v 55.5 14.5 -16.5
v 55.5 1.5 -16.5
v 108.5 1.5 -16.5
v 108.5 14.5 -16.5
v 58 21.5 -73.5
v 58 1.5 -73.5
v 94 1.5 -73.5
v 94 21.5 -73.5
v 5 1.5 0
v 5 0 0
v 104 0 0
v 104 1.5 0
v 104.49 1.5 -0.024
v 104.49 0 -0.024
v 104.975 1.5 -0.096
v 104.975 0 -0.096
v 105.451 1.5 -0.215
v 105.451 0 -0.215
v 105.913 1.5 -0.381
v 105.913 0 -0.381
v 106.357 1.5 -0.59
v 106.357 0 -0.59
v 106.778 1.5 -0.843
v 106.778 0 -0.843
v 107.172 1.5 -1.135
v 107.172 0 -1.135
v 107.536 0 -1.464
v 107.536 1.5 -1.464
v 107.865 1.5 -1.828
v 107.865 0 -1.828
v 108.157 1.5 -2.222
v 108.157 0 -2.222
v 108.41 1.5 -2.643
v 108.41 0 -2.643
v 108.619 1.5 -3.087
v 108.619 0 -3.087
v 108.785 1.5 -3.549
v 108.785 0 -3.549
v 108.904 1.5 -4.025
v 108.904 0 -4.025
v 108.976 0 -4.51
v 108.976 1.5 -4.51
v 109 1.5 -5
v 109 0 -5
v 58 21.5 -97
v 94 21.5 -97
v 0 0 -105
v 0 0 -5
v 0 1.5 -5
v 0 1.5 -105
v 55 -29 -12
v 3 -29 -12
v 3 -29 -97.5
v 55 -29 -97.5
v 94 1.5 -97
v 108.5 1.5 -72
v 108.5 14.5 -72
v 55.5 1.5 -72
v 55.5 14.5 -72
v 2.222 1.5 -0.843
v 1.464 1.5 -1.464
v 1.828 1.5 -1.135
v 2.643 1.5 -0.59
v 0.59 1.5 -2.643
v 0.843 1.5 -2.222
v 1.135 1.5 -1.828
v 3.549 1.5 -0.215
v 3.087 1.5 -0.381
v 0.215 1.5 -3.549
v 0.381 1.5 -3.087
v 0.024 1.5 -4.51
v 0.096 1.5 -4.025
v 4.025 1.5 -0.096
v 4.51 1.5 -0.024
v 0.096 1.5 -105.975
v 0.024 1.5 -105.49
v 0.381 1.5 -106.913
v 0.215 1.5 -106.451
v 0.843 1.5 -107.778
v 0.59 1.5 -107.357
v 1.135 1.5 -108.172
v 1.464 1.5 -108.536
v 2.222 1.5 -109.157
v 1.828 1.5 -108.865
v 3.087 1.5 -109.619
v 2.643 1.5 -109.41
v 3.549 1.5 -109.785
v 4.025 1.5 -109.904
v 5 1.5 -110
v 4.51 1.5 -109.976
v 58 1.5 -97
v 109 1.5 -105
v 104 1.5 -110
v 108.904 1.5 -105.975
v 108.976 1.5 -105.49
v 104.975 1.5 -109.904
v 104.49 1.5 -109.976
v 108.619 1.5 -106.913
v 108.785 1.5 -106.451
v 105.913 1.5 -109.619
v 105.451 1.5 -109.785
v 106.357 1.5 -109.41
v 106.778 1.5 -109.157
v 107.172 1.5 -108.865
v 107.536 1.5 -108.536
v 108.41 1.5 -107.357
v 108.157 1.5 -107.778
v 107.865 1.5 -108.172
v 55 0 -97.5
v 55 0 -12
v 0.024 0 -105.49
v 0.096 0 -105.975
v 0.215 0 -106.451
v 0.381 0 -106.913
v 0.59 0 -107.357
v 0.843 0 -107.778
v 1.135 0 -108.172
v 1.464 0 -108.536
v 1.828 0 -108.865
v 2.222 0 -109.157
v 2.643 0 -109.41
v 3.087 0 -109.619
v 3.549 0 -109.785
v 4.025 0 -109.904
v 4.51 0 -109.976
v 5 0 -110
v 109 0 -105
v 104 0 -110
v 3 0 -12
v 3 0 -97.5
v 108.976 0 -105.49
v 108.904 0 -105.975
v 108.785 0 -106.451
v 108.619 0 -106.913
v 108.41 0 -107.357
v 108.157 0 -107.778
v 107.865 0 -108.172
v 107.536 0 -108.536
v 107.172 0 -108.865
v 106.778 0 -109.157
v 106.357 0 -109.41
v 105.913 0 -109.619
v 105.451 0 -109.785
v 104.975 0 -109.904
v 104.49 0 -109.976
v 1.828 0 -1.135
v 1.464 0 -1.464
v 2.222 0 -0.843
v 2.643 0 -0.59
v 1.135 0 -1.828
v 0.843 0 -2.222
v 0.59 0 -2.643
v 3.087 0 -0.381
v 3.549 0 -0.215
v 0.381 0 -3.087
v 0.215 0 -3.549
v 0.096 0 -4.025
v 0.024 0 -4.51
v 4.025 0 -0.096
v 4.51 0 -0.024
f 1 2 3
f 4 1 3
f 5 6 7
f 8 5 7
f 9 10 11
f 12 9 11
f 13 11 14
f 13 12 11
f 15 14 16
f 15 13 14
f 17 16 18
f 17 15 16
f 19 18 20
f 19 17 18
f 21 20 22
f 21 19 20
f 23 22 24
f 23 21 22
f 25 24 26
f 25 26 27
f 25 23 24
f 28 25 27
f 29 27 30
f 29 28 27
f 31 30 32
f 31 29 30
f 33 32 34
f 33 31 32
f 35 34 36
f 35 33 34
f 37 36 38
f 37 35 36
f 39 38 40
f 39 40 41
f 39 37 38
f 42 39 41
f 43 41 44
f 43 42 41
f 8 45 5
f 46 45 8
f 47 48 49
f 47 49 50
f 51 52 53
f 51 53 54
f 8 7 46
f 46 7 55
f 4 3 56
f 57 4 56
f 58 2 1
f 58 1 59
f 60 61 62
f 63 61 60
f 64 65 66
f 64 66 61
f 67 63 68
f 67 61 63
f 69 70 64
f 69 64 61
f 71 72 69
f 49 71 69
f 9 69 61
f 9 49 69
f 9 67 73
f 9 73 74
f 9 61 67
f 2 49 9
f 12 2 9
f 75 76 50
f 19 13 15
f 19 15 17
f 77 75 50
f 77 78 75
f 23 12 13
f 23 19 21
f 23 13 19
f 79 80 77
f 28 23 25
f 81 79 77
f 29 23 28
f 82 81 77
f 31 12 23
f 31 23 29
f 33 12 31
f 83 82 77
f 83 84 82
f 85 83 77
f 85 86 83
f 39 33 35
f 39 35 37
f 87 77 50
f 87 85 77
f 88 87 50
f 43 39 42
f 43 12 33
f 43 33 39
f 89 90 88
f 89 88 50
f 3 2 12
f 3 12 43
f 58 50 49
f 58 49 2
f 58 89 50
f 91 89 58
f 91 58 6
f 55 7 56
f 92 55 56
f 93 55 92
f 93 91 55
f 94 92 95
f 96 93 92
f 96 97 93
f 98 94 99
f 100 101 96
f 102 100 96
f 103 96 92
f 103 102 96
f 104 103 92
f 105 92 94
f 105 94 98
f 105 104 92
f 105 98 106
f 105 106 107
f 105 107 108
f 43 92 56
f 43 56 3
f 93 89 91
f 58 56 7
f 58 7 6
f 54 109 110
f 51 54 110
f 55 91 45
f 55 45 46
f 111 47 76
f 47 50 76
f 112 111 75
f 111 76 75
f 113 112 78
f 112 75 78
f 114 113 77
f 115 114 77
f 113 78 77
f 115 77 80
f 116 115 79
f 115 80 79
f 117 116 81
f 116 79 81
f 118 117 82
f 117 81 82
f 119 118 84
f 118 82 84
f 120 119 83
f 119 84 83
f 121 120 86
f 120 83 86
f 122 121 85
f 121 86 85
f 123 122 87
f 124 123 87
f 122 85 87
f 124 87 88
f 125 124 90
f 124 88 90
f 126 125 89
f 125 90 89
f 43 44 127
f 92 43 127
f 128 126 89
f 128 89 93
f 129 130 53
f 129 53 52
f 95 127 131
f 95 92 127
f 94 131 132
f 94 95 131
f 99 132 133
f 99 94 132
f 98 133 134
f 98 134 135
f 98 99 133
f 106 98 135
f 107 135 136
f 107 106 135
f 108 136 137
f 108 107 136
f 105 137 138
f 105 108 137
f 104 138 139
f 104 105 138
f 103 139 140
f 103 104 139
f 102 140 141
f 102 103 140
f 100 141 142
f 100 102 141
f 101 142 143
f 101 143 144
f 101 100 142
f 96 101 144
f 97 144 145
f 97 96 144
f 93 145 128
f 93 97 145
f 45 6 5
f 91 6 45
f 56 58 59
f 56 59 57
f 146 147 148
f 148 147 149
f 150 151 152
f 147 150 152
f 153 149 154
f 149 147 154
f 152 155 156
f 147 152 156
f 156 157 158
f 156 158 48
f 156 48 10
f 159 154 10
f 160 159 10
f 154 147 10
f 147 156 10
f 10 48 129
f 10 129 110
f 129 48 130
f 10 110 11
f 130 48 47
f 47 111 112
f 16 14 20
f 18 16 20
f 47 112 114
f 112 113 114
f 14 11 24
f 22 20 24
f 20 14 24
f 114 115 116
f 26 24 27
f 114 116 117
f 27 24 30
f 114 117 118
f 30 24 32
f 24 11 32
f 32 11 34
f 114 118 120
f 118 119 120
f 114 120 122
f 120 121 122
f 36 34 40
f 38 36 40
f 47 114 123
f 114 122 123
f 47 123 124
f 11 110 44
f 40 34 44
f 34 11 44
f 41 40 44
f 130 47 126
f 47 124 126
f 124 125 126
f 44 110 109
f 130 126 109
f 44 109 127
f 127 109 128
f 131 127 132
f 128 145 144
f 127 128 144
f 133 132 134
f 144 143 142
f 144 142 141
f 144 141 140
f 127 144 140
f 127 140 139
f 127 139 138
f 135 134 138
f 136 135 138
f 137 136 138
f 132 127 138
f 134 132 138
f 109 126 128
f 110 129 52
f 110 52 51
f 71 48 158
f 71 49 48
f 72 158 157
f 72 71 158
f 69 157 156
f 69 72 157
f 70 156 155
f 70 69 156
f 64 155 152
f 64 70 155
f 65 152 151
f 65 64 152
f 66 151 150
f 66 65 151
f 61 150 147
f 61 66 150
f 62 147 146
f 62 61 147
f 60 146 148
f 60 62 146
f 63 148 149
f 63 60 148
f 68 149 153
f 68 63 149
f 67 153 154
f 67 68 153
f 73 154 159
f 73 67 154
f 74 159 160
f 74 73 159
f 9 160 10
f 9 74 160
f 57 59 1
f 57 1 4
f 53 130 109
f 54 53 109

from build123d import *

# Parameters (mm, degrees)
ESQUISSE1_W        = 109
ESQUISSE1_H        = 110
BOSS_EXTRU_1_DEPTH = 1.5
CONG_1_R           = 5
ESQUISSE2_W        = 52
ESQUISSE2_H        = 85.5
BOSS_EXTRU_2_DEPTH = 29
ESQUISSE3_W        = 53
ESQUISSE3_H        = 55.5
ESQUISSE3_W_2      = 50
ESQUISSE3_H_2      = 49
BOSS_EXTRU_3_DEPTH = 13
ESQUISSE4_W        = 50
ESQUISSE4_H        = 49
BOSS_EXTRU_4_DEPTH = 13
ESQUISSE5_W        = 36
ESQUISSE5_H        = 23.5
BOSS_EXTRU_5_DEPTH = 20


with BuildPart() as part:
    # Esquisse1 → Boss.-Extru.1 (new body)
    with BuildSketch(Plane(origin=(0, 0, 0), x_dir=(1, 0, 0), z_dir=(0, 1, 0))):
        with Locations((54.5, 55)):
            Rectangle(ESQUISSE1_W, ESQUISSE1_H)
    extrude(amount=BOSS_EXTRU_1_DEPTH)

    # Congé1
    cong_1_edges = [part.edges().sort_by_distance(p)[0] for p in [
        (0, 0.75, -110),
        (109, 0.75, -110),
        (109, 0.75, 0),
        (0, 0.75, 0),
    ]]
    fillet(cong_1_edges, radius=CONG_1_R)

    # Esquisse2 → Boss.-Extru.2 (add)
    with BuildSketch(Plane.XZ):
        with Locations((29, -54.75)):
            Rectangle(ESQUISSE2_W, ESQUISSE2_H)
    extrude(amount=BOSS_EXTRU_2_DEPTH)

    # Esquisse3 → Boss.-Extru.3 (add)
    with BuildSketch(Plane(origin=(0, 1.5, 0), x_dir=(1, 0, 0), z_dir=(0, 1, 0))):
        with Locations((82, 44.25)):
            Rectangle(ESQUISSE3_W, ESQUISSE3_H)
        with Locations((82, 42.5)):
            Rectangle(ESQUISSE3_W_2, ESQUISSE3_H_2, mode=Mode.SUBTRACT)
    extrude(amount=BOSS_EXTRU_3_DEPTH)

    # Esquisse4 → Boss.-Extru.4 (add)
    with BuildSketch(Plane(origin=(0, 1.5, 0), x_dir=(1, 0, 0), z_dir=(0, 1, 0))):
        with Locations((82, 42.5)):
            Rectangle(ESQUISSE4_W, ESQUISSE4_H)
    extrude(amount=BOSS_EXTRU_4_DEPTH)

    # Esquisse5 → Boss.-Extru.5 (add)
    with BuildSketch(Plane(origin=(0, 1.5, 0), x_dir=(1, 0, 0), z_dir=(0, 1, 0))):
        with Locations((76, 85.25)):
            Rectangle(ESQUISSE5_W, ESQUISSE5_H)
    extrude(amount=BOSS_EXTRU_5_DEPTH)


solid = part.part
